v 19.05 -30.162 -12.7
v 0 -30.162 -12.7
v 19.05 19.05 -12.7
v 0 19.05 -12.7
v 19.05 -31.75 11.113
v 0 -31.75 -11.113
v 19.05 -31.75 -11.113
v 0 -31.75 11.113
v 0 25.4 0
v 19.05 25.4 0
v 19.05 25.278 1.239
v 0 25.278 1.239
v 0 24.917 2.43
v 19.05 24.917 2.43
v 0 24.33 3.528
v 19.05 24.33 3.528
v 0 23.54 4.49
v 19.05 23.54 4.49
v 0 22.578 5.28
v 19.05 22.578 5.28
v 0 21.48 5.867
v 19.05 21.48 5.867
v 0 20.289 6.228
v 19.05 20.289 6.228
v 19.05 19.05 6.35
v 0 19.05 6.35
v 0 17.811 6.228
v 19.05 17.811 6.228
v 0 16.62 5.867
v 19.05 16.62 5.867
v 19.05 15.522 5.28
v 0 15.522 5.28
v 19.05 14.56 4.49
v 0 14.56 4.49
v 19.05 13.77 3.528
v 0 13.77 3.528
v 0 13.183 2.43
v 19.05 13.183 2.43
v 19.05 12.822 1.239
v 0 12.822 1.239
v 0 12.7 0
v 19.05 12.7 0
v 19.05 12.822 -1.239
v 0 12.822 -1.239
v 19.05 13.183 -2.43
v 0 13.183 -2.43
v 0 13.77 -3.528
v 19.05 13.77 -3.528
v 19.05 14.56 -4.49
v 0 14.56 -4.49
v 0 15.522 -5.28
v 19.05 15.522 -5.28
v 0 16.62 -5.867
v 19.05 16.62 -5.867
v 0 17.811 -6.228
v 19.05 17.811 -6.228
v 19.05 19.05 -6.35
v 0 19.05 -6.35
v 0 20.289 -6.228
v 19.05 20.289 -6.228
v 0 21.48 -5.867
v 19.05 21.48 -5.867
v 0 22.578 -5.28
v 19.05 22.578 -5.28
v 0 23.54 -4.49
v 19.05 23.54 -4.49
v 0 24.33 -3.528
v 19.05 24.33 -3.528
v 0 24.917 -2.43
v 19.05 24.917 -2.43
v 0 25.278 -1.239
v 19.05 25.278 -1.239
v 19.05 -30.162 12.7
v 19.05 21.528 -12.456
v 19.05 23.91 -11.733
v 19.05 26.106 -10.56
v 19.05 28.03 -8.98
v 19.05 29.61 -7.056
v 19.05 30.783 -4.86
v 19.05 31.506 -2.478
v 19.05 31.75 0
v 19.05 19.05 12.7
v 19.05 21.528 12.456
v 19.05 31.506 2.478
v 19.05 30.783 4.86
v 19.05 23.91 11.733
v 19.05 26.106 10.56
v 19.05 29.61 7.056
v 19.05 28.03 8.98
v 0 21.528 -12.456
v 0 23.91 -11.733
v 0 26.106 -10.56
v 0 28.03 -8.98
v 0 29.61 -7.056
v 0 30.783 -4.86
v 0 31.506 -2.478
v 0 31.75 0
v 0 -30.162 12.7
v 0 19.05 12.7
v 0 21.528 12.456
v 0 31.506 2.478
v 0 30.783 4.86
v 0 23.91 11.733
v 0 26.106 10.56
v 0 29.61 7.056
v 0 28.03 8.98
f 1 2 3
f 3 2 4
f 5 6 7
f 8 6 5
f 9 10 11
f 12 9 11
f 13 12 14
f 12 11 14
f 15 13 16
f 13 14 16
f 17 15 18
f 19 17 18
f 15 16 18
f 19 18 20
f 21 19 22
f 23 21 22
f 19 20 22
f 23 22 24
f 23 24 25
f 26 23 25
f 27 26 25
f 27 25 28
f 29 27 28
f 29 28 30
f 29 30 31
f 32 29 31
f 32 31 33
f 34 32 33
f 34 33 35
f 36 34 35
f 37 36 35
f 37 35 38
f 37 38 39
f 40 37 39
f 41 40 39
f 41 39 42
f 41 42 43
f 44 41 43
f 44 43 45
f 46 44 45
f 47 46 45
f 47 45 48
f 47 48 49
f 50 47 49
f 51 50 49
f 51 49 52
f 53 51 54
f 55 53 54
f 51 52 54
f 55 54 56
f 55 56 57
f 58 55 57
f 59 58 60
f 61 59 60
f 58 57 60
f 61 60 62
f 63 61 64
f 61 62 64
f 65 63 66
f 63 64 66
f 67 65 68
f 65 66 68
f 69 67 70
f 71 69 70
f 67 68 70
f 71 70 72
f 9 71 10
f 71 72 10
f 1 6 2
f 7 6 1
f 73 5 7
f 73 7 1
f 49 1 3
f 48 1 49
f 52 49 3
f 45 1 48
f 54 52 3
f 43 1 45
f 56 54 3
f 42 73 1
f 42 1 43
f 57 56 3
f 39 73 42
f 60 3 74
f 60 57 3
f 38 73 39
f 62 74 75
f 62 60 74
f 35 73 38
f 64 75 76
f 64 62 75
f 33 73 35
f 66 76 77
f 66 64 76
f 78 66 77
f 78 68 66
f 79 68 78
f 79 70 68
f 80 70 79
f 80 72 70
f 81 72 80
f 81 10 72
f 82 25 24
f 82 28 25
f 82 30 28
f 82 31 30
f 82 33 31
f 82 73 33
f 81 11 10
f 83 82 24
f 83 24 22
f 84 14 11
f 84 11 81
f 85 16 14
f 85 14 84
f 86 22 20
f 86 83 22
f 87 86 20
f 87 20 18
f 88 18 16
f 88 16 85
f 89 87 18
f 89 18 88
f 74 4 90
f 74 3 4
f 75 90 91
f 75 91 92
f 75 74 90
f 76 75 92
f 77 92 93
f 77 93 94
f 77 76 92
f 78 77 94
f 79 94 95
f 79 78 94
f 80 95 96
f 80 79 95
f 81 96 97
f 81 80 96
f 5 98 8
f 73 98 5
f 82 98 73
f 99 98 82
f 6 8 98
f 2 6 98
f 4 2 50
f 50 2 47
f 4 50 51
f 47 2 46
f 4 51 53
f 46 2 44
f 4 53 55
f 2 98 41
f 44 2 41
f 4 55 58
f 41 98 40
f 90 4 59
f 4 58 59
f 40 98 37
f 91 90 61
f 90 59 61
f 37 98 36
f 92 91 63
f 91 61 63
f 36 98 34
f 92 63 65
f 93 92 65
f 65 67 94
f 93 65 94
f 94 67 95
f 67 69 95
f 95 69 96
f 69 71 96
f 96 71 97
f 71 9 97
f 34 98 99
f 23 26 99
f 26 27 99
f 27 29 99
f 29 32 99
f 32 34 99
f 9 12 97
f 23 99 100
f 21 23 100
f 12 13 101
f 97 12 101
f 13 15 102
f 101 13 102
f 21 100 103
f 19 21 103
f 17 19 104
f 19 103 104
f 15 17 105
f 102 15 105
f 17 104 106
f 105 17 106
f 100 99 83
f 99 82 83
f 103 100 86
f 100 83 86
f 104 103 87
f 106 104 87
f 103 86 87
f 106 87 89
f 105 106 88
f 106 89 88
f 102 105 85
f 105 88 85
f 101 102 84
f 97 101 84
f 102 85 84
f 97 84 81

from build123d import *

# Parameters (mm, degrees)
F0_W     = 63.5
F0_H     = 25.4
F1_DEPTH = 19.05
F2_R     = 6.35
F3_DEPTH = 25.4
F4_R     = 12.69999
F5_SIZE  = 1.5875


# Not quite as in the source:
# - a fillet or chamfer is up to 0.001 mm smaller than in the source, because OpenCascade refuses the exact size


with BuildPart() as f1:
    # F0 (on Right) → F1 (new body)
    with BuildSketch(Plane.YZ):
        Rectangle(F0_W, F0_H)
    extrude(amount=F1_DEPTH)

    # F2 (on face) → F3 (cut)
    with BuildSketch(Plane.YZ.offset(19.05)):
        with Locations((19.05, 0)):
            Circle(F2_R)
    extrude(amount=-F3_DEPTH, mode=Mode.SUBTRACT)

    # F4 (radius 12.7 in the source; OpenCascade refuses exactly that, so slightly less here)
    f4_edges = [f1.edges().sort_by_distance(p)[0] for p in [
        (9.525, 31.75, 12.7),
        (9.525, 31.75, -12.7),
    ]]
    fillet(f4_edges, radius=F4_R)

    # F5
    f5_edges = [f1.edges().sort_by_distance(p)[0] for p in [
        (9.525, -31.75, 12.7),
        (9.525, -31.75, -12.7),
    ]]
    chamfer(f5_edges, length=F5_SIZE)


solid = f1.part
